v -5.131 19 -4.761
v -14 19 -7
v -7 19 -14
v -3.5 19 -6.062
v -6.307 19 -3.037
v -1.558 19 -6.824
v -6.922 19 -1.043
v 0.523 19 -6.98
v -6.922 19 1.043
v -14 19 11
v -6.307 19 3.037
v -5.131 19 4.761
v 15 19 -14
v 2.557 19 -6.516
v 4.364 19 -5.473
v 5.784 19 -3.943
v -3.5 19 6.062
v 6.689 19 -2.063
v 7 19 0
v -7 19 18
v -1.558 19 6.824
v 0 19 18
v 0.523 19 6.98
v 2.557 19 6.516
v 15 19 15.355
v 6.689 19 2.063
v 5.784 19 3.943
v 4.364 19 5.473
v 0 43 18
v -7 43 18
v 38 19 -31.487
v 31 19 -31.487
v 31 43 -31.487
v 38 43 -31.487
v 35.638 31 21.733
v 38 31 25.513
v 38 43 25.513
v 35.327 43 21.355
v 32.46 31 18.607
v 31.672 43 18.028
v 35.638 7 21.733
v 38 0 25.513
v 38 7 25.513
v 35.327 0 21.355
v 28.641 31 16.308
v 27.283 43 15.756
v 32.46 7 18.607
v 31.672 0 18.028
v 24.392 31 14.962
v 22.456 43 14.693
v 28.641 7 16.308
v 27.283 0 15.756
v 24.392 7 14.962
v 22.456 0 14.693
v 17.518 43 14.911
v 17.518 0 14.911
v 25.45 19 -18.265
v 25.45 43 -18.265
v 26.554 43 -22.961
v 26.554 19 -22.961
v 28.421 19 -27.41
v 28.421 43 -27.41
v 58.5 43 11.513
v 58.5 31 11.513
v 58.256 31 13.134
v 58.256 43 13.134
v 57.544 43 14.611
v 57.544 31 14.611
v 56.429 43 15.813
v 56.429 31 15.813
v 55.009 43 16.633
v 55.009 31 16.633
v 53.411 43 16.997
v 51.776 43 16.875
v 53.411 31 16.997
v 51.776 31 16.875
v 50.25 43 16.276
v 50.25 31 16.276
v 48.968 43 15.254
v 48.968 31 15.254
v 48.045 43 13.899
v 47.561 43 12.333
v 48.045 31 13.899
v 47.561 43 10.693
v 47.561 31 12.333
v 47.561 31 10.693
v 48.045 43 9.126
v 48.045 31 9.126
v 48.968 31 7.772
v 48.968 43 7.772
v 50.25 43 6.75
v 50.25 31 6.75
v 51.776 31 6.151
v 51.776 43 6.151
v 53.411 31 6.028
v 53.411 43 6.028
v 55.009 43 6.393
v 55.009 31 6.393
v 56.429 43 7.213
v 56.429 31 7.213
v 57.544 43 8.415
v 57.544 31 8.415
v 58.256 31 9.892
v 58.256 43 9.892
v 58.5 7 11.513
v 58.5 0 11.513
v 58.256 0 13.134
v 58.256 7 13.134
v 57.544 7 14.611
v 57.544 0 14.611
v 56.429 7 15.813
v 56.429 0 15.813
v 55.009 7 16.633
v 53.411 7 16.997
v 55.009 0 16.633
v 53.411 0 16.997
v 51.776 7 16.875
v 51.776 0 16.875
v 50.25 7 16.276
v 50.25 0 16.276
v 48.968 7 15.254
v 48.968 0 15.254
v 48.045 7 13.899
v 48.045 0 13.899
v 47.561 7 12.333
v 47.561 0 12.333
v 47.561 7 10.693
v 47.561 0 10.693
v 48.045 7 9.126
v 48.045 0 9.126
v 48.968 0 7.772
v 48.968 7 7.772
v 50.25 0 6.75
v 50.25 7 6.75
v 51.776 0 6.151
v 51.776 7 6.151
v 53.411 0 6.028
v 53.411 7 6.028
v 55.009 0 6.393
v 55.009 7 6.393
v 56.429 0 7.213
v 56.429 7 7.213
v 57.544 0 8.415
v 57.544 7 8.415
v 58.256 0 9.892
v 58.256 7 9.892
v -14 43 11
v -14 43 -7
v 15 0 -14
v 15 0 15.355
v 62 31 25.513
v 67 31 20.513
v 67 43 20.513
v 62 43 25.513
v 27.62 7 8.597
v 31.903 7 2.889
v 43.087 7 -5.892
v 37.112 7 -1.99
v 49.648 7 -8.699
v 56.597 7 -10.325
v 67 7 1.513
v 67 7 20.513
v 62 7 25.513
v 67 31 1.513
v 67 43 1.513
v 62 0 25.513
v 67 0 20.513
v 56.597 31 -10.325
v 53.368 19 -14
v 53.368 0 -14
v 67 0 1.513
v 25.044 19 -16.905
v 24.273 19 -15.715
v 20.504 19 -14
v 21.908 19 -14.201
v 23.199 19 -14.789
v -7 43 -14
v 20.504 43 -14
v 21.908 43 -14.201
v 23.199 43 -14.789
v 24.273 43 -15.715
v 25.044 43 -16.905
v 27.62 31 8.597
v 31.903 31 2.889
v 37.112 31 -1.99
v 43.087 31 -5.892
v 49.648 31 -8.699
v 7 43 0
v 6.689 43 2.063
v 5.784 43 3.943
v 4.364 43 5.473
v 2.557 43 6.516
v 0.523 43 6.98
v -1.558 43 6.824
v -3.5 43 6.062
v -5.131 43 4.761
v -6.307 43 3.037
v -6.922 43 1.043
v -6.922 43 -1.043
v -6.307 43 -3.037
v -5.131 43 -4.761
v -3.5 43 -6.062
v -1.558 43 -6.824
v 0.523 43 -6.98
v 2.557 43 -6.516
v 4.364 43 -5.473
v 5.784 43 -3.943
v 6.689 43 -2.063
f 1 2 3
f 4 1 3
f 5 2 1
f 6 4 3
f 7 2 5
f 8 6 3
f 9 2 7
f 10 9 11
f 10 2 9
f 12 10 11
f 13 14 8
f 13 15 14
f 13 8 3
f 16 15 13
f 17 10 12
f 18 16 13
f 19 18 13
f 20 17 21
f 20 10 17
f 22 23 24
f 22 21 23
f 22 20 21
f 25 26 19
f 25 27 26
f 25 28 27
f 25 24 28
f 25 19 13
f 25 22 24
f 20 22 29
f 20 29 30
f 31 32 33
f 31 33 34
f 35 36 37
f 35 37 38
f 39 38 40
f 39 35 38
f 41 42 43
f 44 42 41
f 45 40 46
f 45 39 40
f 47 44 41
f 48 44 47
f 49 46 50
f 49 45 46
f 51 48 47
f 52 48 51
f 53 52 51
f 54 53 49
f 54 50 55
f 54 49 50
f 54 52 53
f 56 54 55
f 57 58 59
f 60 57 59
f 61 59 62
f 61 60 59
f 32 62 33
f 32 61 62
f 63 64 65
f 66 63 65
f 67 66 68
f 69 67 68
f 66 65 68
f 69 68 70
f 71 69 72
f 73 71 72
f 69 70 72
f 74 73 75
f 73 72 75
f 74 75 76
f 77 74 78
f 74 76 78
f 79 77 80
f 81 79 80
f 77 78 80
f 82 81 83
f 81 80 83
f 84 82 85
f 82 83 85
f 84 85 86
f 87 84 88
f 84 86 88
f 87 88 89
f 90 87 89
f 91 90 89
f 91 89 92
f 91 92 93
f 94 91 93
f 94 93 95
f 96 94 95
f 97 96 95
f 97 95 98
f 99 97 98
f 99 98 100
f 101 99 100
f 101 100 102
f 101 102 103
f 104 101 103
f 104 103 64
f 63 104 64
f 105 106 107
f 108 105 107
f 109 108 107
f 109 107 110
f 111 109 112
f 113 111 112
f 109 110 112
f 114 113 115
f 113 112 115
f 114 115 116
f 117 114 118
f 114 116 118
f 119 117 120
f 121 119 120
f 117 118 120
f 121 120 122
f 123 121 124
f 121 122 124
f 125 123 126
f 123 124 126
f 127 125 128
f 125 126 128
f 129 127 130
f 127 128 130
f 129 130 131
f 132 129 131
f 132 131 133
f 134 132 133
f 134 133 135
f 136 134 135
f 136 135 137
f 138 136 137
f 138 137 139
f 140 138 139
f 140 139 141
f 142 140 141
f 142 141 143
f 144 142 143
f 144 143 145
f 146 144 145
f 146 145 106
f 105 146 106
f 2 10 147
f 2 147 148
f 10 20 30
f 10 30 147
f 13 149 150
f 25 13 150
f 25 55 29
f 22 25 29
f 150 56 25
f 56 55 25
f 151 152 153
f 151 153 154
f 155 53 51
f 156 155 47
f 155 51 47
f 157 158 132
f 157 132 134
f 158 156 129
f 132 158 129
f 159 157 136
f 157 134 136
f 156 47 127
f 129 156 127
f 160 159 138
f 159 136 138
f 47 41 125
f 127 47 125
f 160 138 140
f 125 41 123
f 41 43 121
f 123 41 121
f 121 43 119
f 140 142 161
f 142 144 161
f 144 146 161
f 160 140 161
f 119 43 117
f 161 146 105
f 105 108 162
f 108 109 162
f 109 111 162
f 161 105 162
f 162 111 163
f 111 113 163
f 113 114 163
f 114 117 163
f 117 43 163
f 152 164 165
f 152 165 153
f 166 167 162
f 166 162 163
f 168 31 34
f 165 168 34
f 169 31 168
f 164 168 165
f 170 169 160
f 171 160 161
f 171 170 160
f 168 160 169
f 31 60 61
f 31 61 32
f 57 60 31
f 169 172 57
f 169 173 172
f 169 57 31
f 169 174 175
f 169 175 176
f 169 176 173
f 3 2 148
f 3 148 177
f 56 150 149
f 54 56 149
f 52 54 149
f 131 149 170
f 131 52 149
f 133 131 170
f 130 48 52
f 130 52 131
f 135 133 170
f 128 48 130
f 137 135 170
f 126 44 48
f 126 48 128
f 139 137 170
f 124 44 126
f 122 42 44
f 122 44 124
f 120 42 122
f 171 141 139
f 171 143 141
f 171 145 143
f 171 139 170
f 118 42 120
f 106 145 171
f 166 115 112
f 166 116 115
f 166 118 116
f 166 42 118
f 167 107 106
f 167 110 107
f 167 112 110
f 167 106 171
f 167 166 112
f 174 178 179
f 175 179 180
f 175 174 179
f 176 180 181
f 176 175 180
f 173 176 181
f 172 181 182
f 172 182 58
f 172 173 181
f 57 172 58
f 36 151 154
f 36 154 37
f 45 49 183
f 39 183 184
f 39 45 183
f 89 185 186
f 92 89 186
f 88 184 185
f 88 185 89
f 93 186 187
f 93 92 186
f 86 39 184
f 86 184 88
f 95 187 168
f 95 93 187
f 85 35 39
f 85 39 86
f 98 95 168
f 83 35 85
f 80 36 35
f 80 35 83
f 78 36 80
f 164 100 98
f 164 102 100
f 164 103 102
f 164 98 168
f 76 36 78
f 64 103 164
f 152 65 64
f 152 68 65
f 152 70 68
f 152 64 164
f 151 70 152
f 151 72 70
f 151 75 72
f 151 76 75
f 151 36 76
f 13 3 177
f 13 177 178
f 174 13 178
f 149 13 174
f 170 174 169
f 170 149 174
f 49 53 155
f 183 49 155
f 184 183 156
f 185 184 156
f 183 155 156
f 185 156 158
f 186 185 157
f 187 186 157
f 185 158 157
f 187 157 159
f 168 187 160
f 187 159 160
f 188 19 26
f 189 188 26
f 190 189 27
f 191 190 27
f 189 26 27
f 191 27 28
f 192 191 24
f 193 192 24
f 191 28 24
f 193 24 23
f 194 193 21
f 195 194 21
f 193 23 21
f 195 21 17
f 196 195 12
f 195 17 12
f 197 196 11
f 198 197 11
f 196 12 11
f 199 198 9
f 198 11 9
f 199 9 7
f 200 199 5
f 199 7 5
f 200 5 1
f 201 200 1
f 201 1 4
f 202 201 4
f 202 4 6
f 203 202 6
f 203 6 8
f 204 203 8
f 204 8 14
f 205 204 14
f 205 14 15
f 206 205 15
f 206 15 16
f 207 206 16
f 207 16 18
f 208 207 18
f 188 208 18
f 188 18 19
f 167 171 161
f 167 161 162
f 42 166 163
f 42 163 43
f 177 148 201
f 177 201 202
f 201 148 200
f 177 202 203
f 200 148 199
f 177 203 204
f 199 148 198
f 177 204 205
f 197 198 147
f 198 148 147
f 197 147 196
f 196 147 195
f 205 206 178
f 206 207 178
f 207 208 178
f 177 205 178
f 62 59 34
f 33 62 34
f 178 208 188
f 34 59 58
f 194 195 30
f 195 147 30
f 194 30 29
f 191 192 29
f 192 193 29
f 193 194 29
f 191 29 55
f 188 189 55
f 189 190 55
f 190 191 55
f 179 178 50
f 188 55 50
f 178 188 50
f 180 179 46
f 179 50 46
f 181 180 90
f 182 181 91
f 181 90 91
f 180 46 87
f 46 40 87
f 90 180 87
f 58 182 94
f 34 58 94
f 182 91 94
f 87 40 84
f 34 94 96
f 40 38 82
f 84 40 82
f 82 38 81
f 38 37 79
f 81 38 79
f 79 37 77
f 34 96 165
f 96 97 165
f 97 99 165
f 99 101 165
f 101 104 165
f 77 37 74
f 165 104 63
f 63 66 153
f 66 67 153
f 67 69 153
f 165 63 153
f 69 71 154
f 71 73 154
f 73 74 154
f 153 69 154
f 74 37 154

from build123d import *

# Parameters (mm, degrees)
F0_R      = 7
F1_DEPTH  = 43
F2_W      = 81
F2_H      = 19
F3_DEPTH  = 19
F4_W      = 29
F4_H      = 37.6470717937
F5_DEPTH  = 19
F6_R      = 5.5
F7_DEPTH  = 43.001
F10_DEPTH = 12


with BuildPart() as f1:
    # F0 (on Front) → F1 (new body)
    with BuildSketch(Plane.XZ):
        with BuildLine():
            Line((17.5183015976, 14.9110507722), (0, 18))
            Line((0, 18), (-7, 18))
            Line((-7, 18), (-14, 11))
            Line((-14, 11), (-14, -7))
            Line((-14, -7), (-7, -14))
            Line((-7, -14), (20.5039936013, -14))
            ThreePointArc((20.5039936013, -14), (23.7692293823, -15.2134137678), (25.4496323427, -18.2647058824))
            ThreePointArc((25.4496323427, -18.2647058824), (27.3946303601, -25.2244414792), (31, -31.4872081702))
            Line((31, -31.4872081702), (38, -31.4872081702))
            Line((38, -31.4872081702), (67, 1.5127918298))
            Line((67, 1.5127918298), (67, 20.5127918298))
            Line((67, 20.5127918298), (62, 25.5127918298))
            Line((62, 25.5127918298), (38, 25.5127918298))
            ThreePointArc((38, 25.5127918298), (29.5516950708, 16.748872076), (17.5183015976, 14.9110507722))
        make_face()
        Circle(F0_R, mode=Mode.SUBTRACT)
    extrude(amount=-F1_DEPTH)

    # F2 (on face) → F3 (cut)
    with BuildSketch(Plane.XZ):
        with Locations((26.5, -23.5)):
            Rectangle(F2_W, F2_H)
    extrude(amount=-F3_DEPTH, mode=Mode.SUBTRACT)

    # F4 (on face) → F5 (cut)
    with BuildSketch(Plane.XZ):
        with Locations((0.5, 4.8235358968)):
            Rectangle(F4_W, F4_H)
    extrude(amount=-F5_DEPTH, mode=Mode.SUBTRACT)

    # F6 (on face) → F7 (cut, through all)
    with BuildSketch(Plane.XZ):
        with Locations((53, 11.5127918298)):
            Circle(F6_R)
    extrude(amount=-F7_DEPTH, mode=Mode.SUBTRACT)

    # F9 (on offset) → F10 (cut, symmetric)
    with BuildSketch(Plane.XZ.offset(-19)):
        with BuildLine():
            ThreePointArc((21.6885041445, 25.6739929318), (36.8569687391, -1.7884864667), (67, -10.4872081702))
            Line((67, -10.4872081702), (67, 25.5127918298))
            Line((67, 25.5127918298), (21.6885041445, 25.6739929318))
        make_face()
    extrude(amount=F10_DEPTH, both=True, mode=Mode.SUBTRACT)


solid = f1.part
